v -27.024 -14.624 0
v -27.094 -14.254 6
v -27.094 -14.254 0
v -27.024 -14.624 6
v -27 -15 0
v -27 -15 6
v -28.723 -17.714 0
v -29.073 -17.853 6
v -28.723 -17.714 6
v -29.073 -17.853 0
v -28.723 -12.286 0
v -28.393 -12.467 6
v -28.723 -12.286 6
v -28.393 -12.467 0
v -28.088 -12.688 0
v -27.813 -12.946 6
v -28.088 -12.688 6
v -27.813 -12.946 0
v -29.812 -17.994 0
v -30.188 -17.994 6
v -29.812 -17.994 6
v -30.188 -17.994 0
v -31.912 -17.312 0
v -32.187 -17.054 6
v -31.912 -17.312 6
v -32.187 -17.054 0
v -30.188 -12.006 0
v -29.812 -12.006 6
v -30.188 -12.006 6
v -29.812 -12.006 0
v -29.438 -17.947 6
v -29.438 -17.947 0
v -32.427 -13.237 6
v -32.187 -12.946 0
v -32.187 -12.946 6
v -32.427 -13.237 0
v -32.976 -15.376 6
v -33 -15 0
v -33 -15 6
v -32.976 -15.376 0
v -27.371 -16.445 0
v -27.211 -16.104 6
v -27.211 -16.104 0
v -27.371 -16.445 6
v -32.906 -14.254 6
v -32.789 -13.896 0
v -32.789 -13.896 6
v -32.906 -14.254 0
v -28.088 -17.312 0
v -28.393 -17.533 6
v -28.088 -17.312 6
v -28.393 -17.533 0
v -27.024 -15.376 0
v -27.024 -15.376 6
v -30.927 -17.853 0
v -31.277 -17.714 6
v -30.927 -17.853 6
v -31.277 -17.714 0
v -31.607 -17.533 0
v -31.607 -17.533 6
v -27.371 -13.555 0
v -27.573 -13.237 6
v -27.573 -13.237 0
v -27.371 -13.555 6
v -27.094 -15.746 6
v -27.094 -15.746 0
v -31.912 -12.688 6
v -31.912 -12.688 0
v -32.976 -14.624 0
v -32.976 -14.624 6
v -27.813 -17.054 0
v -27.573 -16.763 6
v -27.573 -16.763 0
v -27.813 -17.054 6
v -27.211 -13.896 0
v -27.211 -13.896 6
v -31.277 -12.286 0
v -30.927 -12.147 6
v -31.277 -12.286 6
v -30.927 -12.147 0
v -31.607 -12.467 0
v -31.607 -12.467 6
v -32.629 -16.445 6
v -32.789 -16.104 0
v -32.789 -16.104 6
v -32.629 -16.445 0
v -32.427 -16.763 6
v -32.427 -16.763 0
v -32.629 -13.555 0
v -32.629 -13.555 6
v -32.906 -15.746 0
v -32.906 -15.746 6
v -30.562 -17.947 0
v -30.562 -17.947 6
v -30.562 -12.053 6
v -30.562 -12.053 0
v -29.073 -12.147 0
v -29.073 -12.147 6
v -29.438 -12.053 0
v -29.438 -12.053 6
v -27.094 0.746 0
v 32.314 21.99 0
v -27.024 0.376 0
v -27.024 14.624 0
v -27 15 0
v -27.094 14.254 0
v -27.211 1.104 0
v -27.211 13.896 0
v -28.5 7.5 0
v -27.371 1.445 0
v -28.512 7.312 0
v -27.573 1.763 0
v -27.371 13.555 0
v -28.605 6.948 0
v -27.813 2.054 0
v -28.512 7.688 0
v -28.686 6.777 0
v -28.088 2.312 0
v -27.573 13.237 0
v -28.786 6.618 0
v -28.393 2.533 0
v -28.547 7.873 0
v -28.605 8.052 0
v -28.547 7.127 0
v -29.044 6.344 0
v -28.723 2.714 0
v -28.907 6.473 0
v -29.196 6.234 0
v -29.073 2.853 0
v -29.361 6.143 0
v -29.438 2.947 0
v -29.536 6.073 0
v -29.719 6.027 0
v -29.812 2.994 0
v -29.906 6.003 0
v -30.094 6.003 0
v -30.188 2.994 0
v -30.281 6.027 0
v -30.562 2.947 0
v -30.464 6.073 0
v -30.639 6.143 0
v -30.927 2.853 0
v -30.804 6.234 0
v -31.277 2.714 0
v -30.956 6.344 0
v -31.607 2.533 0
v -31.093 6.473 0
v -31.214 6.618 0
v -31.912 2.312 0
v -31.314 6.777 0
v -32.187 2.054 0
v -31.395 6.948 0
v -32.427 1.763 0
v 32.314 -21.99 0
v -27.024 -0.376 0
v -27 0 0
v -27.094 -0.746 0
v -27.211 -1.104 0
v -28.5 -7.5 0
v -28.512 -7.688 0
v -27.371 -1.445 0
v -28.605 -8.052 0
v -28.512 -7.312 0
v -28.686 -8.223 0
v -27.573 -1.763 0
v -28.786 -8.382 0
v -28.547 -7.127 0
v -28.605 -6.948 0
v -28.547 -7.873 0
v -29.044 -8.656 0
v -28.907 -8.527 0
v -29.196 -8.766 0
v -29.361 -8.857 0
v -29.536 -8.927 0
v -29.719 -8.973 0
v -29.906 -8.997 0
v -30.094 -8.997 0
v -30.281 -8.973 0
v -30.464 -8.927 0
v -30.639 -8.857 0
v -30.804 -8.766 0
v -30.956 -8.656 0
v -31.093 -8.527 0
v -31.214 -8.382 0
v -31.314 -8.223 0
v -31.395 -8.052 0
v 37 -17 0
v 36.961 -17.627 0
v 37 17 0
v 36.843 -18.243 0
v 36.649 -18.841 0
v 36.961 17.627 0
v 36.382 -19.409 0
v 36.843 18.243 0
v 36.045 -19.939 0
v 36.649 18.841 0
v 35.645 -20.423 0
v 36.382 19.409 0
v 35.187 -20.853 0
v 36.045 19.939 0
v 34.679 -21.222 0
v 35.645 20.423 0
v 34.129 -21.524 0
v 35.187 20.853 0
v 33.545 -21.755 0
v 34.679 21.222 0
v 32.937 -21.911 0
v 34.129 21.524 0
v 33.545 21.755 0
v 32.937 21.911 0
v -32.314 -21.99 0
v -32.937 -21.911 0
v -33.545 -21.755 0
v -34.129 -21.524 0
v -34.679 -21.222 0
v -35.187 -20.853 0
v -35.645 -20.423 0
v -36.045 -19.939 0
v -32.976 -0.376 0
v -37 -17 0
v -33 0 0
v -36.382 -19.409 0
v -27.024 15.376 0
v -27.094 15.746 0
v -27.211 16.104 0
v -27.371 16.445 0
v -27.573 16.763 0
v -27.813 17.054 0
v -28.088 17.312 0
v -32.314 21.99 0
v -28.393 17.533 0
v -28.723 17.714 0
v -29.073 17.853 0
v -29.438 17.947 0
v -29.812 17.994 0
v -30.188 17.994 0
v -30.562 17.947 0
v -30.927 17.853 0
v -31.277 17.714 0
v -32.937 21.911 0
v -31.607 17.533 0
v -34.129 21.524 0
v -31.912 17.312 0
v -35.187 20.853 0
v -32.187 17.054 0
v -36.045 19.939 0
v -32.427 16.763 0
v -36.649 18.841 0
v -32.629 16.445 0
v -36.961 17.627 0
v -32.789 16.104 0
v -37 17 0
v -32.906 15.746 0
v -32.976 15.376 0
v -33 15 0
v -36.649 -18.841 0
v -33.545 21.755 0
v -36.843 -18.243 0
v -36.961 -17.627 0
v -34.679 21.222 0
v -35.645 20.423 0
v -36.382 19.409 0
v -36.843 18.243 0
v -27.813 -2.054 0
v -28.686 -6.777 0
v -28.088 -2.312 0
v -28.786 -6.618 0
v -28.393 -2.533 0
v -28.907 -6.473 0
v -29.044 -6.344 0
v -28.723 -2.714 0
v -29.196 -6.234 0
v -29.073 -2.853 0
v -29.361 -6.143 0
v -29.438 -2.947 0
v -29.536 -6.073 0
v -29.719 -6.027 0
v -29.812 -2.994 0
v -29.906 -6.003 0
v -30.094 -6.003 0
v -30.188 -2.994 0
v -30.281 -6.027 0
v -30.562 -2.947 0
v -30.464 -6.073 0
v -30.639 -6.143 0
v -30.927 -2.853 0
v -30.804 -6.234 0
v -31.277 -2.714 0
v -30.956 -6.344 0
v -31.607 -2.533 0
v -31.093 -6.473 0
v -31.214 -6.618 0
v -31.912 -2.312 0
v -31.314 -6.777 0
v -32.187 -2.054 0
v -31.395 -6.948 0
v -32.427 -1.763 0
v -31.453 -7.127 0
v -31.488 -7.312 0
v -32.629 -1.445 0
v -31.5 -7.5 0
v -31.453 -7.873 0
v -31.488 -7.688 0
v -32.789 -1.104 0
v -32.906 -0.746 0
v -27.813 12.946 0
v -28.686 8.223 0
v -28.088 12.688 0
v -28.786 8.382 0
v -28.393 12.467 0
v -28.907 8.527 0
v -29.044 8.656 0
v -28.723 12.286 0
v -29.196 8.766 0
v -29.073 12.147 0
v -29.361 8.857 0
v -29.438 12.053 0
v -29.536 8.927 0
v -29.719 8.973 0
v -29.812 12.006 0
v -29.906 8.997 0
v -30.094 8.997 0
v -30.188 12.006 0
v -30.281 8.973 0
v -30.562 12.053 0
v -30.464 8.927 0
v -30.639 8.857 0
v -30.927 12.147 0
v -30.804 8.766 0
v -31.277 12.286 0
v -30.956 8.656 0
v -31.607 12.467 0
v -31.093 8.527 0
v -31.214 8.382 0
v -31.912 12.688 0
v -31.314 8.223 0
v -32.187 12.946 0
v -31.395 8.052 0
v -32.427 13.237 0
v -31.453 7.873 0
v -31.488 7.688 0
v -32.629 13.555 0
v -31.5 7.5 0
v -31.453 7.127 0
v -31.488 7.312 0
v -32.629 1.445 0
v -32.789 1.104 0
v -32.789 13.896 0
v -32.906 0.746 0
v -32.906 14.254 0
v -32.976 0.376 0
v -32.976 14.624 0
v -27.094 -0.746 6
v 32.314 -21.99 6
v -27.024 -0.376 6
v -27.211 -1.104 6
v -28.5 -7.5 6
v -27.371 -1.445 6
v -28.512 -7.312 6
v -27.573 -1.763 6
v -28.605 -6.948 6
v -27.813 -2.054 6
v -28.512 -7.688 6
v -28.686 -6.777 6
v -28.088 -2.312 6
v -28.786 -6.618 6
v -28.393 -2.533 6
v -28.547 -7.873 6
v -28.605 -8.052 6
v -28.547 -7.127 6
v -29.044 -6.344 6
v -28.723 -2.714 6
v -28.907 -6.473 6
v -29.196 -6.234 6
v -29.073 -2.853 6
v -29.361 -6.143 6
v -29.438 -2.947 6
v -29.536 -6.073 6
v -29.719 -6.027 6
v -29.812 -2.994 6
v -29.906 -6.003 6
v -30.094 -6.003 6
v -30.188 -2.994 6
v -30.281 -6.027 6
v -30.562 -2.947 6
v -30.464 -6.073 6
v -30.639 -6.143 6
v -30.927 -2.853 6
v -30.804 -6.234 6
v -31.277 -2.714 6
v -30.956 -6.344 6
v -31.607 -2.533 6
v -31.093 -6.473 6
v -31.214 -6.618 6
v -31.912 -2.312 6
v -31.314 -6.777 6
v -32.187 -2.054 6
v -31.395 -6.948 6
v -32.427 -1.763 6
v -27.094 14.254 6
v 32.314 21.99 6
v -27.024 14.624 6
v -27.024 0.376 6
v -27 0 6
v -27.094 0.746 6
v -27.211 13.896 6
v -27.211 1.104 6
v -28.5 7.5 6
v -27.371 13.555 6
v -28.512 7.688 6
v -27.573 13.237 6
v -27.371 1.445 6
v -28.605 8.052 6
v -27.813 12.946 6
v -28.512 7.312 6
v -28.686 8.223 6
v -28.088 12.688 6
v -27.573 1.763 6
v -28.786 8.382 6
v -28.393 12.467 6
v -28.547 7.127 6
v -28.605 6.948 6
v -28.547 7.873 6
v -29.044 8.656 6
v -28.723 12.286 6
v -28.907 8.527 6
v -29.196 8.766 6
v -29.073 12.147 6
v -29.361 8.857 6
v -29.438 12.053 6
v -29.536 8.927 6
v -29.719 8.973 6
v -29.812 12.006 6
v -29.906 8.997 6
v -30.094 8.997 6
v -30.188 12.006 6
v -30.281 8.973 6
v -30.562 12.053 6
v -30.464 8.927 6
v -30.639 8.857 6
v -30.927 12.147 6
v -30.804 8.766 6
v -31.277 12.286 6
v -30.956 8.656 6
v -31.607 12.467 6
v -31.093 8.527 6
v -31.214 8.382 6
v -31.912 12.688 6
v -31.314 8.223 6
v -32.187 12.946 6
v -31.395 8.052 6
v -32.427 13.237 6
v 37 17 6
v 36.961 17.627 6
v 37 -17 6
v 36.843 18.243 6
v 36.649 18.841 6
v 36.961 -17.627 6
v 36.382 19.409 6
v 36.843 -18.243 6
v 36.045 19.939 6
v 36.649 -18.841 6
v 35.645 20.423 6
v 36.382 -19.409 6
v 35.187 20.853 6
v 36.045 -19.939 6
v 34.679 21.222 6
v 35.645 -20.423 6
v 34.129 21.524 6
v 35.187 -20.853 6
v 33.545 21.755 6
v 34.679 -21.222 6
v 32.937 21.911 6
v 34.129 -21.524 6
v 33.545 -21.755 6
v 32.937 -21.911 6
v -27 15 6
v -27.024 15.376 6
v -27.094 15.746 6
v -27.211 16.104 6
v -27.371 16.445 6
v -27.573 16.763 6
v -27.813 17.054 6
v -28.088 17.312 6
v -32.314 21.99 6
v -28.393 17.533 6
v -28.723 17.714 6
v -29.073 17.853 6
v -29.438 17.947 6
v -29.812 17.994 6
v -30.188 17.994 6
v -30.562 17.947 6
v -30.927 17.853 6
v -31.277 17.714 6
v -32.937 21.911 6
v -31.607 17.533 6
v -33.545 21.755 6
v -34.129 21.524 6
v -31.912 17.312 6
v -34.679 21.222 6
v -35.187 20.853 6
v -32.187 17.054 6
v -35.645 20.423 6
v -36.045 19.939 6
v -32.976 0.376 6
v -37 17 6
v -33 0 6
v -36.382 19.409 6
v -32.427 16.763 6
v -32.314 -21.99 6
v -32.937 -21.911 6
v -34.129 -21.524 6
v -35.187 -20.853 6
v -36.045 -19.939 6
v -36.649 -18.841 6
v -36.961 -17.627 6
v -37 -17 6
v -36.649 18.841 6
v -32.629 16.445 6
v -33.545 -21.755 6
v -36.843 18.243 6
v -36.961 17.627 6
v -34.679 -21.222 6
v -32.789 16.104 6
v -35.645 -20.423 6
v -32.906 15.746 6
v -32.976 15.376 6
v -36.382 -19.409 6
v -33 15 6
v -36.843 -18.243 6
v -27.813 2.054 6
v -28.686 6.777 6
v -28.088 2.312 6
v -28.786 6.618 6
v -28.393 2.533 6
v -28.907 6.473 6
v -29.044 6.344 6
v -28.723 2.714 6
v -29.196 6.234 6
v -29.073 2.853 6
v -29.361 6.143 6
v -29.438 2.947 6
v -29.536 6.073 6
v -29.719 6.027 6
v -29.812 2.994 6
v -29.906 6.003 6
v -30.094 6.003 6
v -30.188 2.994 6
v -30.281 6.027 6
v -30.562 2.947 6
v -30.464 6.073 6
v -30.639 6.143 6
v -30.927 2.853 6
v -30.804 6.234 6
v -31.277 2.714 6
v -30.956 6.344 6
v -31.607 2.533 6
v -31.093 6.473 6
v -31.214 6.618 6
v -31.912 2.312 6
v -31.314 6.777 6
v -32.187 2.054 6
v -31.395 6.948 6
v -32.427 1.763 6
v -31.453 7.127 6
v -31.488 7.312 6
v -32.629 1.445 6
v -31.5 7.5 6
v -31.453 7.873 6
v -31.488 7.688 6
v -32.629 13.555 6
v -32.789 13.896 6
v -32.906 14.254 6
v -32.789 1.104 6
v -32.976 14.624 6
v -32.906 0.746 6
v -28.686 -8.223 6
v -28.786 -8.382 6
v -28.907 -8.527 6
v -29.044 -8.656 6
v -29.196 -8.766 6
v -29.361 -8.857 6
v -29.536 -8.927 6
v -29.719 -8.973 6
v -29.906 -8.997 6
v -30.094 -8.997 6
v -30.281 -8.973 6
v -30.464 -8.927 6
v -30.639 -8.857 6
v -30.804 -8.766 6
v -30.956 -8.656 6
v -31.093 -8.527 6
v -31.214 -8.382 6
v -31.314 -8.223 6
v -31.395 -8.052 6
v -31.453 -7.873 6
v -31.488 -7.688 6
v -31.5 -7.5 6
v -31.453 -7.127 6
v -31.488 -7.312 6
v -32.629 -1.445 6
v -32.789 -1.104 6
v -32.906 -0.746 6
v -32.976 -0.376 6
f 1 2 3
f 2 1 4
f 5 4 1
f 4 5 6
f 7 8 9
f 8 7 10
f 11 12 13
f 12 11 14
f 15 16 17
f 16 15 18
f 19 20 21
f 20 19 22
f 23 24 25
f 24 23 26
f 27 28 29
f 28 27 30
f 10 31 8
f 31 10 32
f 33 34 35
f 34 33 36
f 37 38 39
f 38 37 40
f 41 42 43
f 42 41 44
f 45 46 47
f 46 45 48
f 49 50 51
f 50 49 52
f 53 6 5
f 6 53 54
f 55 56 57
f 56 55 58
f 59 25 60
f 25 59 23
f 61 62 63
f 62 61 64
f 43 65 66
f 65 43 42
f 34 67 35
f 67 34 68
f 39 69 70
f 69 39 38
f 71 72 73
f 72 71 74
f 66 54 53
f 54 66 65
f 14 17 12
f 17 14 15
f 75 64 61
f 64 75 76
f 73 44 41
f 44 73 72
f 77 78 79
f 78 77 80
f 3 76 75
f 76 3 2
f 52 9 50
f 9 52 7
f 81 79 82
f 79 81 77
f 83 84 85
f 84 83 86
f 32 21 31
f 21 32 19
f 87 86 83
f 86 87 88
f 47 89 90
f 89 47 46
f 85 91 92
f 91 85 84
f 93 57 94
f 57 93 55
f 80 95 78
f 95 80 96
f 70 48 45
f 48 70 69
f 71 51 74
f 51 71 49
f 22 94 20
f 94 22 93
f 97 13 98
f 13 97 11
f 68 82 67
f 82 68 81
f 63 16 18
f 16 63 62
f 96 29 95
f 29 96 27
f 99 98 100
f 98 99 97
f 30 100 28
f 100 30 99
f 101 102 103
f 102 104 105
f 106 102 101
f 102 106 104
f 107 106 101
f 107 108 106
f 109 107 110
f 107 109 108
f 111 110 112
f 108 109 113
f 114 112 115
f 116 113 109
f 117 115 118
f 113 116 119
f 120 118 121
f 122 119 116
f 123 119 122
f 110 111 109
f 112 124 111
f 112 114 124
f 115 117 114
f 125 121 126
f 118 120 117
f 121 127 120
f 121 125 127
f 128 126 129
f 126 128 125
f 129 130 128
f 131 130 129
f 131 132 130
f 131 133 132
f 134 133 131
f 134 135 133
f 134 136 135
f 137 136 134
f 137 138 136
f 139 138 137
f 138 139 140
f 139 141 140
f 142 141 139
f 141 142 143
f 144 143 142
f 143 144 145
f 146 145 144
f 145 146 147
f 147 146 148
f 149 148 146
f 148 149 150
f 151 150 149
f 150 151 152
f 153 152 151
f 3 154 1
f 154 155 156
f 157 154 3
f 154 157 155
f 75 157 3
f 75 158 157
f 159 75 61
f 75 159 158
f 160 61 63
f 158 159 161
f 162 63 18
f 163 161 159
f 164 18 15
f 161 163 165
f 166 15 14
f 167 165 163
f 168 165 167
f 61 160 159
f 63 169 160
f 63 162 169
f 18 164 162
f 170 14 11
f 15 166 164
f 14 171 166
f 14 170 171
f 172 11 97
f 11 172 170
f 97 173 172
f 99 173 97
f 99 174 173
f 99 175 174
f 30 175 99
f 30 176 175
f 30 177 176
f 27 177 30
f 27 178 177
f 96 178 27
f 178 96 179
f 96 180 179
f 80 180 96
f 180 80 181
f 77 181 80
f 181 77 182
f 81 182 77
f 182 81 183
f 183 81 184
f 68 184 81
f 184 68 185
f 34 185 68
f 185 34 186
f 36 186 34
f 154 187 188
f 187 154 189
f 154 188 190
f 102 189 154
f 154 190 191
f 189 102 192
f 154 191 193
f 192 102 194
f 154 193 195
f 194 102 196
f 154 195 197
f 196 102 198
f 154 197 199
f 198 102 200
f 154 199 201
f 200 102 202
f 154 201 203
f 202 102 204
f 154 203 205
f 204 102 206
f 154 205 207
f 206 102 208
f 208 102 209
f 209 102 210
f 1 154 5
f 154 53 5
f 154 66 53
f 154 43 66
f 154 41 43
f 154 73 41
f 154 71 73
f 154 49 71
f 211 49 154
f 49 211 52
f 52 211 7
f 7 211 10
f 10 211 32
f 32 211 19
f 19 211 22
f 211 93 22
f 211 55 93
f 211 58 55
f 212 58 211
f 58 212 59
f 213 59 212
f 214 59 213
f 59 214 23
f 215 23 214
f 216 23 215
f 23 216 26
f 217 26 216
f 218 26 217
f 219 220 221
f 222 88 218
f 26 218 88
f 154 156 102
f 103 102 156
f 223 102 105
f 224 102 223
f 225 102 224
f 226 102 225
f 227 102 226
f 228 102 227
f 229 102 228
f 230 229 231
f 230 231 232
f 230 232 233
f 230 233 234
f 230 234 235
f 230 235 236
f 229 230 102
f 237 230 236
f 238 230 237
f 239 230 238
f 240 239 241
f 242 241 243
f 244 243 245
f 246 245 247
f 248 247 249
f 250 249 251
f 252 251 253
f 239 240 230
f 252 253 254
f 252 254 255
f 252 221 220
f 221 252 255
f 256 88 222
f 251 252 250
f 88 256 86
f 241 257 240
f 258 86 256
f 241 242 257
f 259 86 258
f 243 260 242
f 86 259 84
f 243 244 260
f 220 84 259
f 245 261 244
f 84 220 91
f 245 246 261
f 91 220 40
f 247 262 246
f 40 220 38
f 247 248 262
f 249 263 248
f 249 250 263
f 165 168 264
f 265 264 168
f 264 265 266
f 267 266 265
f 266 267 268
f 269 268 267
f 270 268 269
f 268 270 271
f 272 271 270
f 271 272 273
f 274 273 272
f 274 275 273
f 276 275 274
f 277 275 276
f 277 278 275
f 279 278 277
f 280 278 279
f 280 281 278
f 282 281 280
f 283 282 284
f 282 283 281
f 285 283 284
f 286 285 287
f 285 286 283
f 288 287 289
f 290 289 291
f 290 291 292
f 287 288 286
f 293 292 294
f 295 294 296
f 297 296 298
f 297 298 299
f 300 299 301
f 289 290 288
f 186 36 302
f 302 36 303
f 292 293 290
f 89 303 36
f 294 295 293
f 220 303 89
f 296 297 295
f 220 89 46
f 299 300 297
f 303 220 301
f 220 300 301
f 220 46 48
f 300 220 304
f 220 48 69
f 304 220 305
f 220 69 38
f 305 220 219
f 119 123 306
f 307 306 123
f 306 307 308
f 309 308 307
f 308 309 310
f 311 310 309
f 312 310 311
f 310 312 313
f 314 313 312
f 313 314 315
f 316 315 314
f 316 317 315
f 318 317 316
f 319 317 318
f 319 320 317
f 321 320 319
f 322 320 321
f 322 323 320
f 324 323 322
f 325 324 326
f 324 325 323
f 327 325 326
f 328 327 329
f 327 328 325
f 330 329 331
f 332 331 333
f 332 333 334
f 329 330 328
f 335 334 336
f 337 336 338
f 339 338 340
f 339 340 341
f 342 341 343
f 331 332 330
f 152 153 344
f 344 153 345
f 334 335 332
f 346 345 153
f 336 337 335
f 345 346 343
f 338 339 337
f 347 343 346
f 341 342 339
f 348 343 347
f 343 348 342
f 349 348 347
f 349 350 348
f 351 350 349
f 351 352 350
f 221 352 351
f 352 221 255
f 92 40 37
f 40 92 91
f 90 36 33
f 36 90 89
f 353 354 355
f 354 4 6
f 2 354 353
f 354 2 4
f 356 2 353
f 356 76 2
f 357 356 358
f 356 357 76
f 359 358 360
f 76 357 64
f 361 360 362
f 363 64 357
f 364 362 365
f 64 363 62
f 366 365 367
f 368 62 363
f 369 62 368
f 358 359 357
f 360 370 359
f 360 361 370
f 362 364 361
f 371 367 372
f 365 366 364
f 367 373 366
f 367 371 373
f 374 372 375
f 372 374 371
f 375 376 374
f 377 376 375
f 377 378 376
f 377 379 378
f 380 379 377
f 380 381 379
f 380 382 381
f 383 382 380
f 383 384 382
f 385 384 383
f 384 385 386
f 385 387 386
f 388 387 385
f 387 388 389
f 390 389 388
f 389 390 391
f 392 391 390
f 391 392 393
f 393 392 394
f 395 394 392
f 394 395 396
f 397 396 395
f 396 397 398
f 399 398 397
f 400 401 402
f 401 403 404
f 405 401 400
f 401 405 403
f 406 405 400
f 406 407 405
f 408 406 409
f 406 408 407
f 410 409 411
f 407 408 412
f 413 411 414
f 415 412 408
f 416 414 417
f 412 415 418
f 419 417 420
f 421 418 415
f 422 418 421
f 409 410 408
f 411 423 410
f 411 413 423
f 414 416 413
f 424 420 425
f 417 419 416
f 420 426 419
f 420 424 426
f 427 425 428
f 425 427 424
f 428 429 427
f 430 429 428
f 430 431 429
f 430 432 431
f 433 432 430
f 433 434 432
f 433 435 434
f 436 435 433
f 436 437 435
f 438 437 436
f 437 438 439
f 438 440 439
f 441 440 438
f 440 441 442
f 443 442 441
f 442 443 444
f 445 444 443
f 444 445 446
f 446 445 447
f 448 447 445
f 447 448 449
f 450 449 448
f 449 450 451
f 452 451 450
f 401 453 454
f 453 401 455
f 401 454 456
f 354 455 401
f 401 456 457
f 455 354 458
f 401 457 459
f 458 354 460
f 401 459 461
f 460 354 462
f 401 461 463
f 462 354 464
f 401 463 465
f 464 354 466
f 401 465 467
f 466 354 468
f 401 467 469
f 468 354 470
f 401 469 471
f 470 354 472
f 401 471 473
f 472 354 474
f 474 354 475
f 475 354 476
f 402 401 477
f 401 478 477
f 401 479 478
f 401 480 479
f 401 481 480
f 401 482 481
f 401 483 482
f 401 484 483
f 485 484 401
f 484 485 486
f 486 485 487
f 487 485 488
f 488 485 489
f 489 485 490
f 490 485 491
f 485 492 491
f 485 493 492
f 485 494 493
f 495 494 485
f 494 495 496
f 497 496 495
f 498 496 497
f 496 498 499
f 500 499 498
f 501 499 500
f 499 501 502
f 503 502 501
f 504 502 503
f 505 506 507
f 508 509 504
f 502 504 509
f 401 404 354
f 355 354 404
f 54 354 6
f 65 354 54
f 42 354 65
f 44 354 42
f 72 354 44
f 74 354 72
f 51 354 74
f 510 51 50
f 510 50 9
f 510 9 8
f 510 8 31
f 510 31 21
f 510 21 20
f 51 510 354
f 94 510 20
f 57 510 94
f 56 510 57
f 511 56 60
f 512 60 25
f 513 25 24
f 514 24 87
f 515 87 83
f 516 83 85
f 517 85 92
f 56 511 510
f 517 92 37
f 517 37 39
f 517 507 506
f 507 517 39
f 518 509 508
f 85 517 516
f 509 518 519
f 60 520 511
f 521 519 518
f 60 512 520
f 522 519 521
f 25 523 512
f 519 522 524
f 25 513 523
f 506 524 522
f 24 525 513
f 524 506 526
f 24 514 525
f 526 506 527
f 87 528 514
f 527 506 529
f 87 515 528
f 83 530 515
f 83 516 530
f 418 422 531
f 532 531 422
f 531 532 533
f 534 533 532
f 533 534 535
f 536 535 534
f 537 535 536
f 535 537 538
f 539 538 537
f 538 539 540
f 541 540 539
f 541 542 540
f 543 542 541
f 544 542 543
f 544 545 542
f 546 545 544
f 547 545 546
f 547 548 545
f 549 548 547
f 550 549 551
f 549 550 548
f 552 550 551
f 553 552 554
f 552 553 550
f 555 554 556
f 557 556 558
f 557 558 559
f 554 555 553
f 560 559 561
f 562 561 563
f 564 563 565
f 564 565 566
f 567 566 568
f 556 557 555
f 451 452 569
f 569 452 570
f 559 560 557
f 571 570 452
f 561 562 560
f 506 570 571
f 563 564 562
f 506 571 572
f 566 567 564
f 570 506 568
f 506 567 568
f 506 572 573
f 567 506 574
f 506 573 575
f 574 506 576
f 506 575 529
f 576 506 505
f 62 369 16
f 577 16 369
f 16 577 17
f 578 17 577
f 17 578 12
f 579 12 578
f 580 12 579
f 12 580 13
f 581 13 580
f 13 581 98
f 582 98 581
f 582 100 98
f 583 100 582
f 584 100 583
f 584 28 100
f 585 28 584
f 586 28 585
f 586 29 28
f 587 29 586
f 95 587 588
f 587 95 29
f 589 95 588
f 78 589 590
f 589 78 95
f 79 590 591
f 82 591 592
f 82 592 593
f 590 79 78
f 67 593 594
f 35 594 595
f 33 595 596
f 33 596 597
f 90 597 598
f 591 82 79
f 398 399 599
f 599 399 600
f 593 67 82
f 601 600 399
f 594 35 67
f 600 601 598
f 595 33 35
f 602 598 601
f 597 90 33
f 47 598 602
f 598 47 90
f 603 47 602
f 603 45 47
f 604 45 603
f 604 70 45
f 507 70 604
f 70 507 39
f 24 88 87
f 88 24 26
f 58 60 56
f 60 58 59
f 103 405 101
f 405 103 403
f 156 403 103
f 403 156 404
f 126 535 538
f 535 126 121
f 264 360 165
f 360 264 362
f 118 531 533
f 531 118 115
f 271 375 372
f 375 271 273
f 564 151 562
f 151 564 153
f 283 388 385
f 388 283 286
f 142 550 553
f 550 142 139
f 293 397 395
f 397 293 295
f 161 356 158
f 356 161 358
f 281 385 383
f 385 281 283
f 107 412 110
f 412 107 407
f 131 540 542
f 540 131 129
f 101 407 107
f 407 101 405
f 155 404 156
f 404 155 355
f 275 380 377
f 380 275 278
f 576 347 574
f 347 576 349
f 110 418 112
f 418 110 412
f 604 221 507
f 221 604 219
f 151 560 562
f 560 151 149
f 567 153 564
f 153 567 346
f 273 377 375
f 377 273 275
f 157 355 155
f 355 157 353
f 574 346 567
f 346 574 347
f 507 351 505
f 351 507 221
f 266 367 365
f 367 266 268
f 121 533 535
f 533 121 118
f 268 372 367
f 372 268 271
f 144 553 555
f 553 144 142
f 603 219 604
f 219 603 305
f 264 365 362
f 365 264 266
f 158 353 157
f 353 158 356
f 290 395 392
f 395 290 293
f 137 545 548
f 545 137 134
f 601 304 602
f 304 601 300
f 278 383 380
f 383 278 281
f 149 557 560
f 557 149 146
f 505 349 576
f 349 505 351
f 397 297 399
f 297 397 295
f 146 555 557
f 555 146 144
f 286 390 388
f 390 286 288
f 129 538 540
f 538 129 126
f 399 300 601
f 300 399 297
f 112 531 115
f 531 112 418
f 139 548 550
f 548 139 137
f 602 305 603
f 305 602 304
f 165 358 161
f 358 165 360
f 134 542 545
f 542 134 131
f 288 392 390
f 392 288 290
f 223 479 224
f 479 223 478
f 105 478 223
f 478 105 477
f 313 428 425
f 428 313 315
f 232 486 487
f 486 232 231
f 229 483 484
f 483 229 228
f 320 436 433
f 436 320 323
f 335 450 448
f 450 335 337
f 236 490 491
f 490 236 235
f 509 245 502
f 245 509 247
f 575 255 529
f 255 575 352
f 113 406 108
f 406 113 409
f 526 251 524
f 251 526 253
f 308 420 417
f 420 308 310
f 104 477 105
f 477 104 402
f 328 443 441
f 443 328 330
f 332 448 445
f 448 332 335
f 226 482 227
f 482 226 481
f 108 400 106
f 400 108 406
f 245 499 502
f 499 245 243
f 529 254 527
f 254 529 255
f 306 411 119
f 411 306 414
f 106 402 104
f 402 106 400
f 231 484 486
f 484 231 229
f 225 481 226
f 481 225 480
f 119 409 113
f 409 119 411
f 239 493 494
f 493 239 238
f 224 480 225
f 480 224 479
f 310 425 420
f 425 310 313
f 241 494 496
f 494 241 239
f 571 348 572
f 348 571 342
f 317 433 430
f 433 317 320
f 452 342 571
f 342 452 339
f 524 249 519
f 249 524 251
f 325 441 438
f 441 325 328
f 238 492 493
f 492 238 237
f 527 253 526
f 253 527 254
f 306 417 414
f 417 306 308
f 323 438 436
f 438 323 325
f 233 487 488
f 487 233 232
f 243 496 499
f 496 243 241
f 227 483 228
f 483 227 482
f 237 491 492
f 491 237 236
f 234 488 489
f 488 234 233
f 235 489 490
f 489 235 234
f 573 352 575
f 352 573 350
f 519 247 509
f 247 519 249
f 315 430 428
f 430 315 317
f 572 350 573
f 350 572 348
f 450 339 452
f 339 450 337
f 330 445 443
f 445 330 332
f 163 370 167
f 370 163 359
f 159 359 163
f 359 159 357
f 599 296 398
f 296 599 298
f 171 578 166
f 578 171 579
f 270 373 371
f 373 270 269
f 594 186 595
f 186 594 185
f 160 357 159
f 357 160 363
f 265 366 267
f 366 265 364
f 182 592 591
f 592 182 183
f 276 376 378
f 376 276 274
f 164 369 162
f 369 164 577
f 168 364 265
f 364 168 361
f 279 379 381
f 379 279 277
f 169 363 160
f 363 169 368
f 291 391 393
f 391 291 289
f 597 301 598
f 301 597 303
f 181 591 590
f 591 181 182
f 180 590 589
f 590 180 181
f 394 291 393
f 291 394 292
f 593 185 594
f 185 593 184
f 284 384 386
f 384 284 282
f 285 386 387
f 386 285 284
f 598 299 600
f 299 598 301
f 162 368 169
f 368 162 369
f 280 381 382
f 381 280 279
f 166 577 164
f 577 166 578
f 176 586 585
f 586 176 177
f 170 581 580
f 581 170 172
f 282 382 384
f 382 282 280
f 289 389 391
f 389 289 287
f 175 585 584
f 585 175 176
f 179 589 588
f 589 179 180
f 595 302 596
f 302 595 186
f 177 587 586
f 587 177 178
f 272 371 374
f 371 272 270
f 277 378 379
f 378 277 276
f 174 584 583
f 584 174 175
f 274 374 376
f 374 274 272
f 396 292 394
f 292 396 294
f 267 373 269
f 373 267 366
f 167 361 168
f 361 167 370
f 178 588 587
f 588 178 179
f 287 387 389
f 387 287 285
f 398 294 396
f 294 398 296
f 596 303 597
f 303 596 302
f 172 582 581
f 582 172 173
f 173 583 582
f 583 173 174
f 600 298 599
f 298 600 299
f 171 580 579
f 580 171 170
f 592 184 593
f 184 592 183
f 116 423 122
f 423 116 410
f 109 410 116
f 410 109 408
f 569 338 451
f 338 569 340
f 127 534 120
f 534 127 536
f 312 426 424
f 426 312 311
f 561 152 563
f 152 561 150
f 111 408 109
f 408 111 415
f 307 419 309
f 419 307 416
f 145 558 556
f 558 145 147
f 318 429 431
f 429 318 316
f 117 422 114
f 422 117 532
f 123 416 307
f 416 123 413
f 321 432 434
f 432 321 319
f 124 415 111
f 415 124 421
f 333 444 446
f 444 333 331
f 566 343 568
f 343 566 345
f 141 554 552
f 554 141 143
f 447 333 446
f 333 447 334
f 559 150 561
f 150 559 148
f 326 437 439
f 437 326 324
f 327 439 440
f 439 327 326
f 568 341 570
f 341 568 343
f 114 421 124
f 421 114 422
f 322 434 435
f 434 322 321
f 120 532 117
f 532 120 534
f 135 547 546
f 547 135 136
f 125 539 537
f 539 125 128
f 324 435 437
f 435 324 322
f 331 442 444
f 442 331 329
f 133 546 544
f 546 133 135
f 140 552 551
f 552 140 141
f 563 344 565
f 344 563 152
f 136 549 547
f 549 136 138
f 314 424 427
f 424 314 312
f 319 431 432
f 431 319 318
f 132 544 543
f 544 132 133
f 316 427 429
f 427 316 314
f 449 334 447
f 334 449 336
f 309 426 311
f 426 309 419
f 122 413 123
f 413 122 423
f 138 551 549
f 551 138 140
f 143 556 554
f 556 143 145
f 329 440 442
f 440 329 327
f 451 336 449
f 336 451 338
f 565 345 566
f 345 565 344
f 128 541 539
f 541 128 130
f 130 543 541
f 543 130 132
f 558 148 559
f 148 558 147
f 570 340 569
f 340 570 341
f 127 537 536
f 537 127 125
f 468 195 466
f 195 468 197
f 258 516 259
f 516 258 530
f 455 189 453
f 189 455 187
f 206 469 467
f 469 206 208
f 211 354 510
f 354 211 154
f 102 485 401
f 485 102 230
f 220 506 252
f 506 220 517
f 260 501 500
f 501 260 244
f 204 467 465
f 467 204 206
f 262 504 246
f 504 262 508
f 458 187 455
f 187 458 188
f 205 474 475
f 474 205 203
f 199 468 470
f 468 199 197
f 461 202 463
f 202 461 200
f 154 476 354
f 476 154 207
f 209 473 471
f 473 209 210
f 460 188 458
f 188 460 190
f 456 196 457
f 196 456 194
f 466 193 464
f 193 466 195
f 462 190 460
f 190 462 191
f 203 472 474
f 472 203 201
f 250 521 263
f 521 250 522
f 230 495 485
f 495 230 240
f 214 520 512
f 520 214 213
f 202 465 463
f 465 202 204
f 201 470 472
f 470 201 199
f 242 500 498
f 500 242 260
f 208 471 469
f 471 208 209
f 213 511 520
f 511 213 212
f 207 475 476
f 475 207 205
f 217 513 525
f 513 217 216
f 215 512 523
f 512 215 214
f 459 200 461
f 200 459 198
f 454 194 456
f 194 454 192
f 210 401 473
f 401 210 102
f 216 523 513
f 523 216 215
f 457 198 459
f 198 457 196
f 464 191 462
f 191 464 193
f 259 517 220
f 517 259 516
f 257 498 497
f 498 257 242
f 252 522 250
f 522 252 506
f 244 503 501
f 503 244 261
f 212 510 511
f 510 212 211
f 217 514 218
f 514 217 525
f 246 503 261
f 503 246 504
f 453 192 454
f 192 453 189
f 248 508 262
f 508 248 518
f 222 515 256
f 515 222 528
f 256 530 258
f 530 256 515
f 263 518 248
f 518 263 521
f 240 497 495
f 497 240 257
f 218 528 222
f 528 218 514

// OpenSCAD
$fn = 50;


difference() {
	union() {
		hull() {
			translate(v = [-32.0000000000, 17.0000000000, 0]) {
				cylinder(h = 6, r = 5);
			}
			translate(v = [32.0000000000, 17.0000000000, 0]) {
				cylinder(h = 6, r = 5);
			}
			translate(v = [-32.0000000000, -17.0000000000, 0]) {
				cylinder(h = 6, r = 5);
			}
			translate(v = [32.0000000000, -17.0000000000, 0]) {
				cylinder(h = 6, r = 5);
			}
		}
	}
	union() {
		translate(v = [-30.0000000000, -15.0000000000, 0]) {
			cylinder(h = 6, r = 3.0000000000);
		}
		translate(v = [-30.0000000000, 0.0000000000, 0]) {
			cylinder(h = 6, r = 3.0000000000);
		}
		translate(v = [-30.0000000000, 15.0000000000, 0]) {
			cylinder(h = 6, r = 3.0000000000);
		}
		translate(v = [-30.0000000000, -15.0000000000, 0]) {
			cylinder(h = 6, r = 1.5000000000);
		}
		translate(v = [-30.0000000000, -7.5000000000, 0]) {
			cylinder(h = 6, r = 1.5000000000);
		}
		translate(v = [-30.0000000000, 0.0000000000, 0]) {
			cylinder(h = 6, r = 1.5000000000);
		}
		translate(v = [-30.0000000000, 7.5000000000, 0]) {
			cylinder(h = 6, r = 1.5000000000);
		}
		translate(v = [-30.0000000000, 15.0000000000, 0]) {
			cylinder(h = 6, r = 1.5000000000);
		}
		translate(v = [-30.0000000000, -15.0000000000, 0]) {
			cylinder(h = 6, r = 1.5000000000);
		}
		translate(v = [-30.0000000000, -7.5000000000, 0]) {
			cylinder(h = 6, r = 1.5000000000);
		}
		translate(v = [-30.0000000000, 0.0000000000, 0]) {
			cylinder(h = 6, r = 1.5000000000);
		}
		translate(v = [-30.0000000000, 7.5000000000, 0]) {
			cylinder(h = 6, r = 1.5000000000);
		}
		translate(v = [-30.0000000000, 15.0000000000, 0]) {
			cylinder(h = 6, r = 1.5000000000);
		}
		translate(v = [-30.0000000000, -15.0000000000, 0]) {
			cylinder(h = 6, r = 1.5000000000);
		}
		translate(v = [-30.0000000000, -7.5000000000, 0]) {
			cylinder(h = 6, r = 1.5000000000);
		}
		translate(v = [-30.0000000000, 0.0000000000, 0]) {
			cylinder(h = 6, r = 1.5000000000);
		}
		translate(v = [-30.0000000000, 7.5000000000, 0]) {
			cylinder(h = 6, r = 1.5000000000);
		}
		translate(v = [-30.0000000000, 15.0000000000, 0]) {
			cylinder(h = 6, r = 1.5000000000);
		}
	}
}
